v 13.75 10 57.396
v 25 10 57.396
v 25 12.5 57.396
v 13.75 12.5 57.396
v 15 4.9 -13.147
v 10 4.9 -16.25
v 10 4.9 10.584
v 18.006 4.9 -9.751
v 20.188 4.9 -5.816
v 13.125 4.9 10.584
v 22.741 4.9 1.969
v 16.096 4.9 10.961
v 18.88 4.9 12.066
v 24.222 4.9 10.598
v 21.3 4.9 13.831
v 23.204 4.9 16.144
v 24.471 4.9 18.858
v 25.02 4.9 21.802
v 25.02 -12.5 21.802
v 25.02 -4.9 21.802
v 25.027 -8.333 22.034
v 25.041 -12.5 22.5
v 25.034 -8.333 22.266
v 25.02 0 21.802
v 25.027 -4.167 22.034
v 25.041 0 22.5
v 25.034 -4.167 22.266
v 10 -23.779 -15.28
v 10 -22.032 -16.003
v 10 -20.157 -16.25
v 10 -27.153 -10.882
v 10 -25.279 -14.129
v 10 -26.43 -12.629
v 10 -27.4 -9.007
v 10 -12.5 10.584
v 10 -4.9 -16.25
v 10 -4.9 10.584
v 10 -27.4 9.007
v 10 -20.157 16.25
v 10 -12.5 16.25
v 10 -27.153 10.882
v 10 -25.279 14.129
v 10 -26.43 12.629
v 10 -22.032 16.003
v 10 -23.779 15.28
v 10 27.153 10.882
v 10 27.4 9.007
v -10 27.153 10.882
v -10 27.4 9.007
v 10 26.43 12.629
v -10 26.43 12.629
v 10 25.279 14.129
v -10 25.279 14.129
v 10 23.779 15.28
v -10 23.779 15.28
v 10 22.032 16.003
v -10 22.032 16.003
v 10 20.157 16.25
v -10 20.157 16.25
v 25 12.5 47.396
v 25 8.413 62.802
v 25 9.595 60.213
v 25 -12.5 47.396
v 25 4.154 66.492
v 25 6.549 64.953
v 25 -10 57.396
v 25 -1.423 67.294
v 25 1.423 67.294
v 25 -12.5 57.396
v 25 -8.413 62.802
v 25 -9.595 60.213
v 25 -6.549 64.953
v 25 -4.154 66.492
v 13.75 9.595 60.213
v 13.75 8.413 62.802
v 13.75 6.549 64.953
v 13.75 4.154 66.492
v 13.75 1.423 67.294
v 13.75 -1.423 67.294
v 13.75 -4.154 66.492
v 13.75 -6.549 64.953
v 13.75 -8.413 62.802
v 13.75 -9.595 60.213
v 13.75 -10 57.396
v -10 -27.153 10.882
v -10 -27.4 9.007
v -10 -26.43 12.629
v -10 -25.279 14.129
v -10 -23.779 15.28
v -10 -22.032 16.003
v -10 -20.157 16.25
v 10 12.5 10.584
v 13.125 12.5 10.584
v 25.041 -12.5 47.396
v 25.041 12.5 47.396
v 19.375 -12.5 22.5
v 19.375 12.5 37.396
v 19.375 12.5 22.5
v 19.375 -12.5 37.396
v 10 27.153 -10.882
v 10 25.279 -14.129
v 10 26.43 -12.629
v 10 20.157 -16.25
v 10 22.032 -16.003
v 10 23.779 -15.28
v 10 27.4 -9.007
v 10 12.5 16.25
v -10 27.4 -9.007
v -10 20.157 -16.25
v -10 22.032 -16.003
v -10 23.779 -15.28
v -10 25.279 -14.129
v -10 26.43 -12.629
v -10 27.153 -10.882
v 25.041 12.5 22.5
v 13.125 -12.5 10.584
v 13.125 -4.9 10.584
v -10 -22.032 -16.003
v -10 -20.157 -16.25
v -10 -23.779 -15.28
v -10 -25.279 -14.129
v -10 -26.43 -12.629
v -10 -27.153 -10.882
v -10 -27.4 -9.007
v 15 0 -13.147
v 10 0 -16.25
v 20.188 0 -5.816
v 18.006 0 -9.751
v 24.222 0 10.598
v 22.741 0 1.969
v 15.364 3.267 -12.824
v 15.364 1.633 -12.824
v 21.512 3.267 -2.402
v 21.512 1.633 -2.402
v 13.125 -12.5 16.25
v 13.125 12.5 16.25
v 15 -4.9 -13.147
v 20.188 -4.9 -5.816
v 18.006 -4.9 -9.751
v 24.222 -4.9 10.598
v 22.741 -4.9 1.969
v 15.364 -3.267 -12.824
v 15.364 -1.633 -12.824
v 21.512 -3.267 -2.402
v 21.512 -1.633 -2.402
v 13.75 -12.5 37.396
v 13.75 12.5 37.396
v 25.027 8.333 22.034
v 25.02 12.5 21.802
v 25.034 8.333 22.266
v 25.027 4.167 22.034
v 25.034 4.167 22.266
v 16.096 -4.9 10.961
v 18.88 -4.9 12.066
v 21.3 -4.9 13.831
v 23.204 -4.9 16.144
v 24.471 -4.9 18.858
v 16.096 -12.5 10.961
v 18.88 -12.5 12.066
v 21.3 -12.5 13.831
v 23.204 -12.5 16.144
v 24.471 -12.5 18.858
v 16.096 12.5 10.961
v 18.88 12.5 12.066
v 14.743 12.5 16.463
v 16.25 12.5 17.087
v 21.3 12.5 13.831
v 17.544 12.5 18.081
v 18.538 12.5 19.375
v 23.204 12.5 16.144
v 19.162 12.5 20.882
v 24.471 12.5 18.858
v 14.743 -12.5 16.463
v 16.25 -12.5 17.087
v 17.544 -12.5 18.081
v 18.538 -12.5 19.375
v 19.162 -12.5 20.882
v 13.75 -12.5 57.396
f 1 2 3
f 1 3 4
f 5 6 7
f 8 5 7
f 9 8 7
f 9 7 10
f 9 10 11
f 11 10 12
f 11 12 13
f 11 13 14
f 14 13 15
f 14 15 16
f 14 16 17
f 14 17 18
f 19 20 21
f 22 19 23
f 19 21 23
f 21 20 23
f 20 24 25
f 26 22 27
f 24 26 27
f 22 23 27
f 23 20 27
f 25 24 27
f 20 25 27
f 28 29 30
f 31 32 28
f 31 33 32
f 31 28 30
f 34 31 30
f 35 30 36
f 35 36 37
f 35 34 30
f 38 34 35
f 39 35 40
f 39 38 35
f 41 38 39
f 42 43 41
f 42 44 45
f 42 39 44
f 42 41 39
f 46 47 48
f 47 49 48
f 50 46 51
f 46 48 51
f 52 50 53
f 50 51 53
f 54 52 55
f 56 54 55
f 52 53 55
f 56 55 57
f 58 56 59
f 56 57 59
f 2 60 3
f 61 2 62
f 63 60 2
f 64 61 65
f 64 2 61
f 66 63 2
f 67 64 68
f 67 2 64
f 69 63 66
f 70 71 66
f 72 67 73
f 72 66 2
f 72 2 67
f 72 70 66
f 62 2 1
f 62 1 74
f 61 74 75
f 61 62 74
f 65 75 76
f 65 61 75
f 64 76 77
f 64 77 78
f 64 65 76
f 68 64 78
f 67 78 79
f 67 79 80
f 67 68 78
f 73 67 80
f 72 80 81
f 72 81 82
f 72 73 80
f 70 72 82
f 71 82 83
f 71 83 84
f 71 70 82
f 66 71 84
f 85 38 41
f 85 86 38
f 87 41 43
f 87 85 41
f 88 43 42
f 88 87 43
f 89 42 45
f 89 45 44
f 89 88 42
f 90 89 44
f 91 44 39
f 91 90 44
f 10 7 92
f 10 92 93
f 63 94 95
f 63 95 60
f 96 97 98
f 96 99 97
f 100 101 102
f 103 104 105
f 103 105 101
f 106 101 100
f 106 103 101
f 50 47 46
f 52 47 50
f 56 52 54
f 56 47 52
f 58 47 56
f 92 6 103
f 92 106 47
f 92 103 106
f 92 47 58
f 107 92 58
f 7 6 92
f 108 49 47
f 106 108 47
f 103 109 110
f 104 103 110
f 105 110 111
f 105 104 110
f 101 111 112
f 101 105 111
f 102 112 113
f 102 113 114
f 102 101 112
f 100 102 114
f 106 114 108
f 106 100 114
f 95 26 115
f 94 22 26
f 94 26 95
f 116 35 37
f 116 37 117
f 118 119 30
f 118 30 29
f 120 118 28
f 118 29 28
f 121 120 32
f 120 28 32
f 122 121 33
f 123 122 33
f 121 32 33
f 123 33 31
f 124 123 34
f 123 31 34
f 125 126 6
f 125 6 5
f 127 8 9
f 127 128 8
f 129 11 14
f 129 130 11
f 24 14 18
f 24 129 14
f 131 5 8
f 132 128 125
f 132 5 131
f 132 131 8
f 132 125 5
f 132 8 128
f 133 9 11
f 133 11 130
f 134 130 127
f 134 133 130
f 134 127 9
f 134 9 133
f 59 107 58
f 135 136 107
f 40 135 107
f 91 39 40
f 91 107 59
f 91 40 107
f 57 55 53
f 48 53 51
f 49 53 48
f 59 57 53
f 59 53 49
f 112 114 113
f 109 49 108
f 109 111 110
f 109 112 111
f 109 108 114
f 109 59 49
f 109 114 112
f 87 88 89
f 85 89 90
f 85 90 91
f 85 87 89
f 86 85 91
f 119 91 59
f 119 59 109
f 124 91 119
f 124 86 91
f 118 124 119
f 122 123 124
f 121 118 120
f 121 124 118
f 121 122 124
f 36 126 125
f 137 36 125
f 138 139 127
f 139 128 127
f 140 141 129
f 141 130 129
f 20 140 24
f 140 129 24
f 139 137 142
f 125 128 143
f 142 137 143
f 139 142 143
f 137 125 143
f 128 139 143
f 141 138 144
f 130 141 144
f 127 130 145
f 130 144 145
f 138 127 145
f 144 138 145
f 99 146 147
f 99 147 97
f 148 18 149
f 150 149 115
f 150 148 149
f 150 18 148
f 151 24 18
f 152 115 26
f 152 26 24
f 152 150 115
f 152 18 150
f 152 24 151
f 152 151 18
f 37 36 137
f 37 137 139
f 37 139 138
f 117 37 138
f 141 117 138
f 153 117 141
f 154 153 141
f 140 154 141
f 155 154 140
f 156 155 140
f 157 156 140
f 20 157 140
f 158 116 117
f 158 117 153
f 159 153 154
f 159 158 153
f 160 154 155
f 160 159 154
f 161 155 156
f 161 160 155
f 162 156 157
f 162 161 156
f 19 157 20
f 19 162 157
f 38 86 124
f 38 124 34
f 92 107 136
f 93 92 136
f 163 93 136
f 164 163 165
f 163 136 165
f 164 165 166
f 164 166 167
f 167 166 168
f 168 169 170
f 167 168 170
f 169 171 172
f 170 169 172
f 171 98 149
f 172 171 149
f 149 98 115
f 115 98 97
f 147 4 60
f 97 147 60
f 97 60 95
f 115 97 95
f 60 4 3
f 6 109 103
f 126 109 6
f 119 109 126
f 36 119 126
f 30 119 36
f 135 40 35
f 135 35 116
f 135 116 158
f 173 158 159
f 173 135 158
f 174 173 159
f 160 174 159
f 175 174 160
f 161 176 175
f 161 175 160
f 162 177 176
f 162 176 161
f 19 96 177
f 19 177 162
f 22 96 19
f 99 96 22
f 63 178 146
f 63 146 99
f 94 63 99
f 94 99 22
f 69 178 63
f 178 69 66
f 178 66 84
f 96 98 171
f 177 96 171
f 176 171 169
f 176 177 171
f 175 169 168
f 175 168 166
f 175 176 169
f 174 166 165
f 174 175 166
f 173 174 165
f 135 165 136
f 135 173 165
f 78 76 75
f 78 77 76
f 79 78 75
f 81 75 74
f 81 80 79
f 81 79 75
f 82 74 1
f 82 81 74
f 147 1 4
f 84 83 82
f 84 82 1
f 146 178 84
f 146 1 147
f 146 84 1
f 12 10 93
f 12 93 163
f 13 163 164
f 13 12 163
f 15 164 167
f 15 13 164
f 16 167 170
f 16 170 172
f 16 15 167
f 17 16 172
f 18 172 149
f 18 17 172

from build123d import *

# Parameters (mm, degrees)
F1_DEPTH = 27.4
F0_W     = 5.625
F0_H     = 10
F2_DEPTH = 12.5
F3_DEPTH = 4.9
F5_R     = 7.242641


with BuildPart() as f1:
    # F0 (on Front) → F1 (new body, symmetric)
    with BuildSketch(Plane.XZ):
        Polygon((10, 16.25), (-10, 16.25), (-10, -16.25), (10, -16.25), (10, 10.584195), align=None)
    extrude(amount=F1_DEPTH, both=True)

    # F0 (on Front) → F2 (join, symmetric)
    with BuildSketch(Plane.XZ):
        with BuildLine():
            Line((13.125, 16.25), (10, 16.25))
            Line((10, 16.25), (10, 10.584195))
            Line((10, 10.584195), (13.125, 10.584195))
            ThreePointArc((13.125, 10.584195), (21.300311, 13.83105), (25.020355, 21.802188))
            add(Edge.make_bspline(
                [(25.020355, 21.802188), (25.02761, 22.033307), (25.034428, 22.265908), (25.040805, 22.5)],
                knots=[41.280664, 41.280664, 41.280664, 41.280664, 41.566673, 41.566673, 41.566673, 41.566673], degree=3))
            Line((25.040805, 22.5), (25.040805, 47.395553))
            Line((25.040805, 47.395553), (25, 47.395553))
            Line((25, 47.395553), (25, 37.395553))
            Line((25, 37.395553), (19.375, 37.395553))
            Line((19.375, 37.395553), (19.375, 22.5))
            ThreePointArc((19.375, 22.5), (17.544417, 18.080583), (13.125, 16.25))
        make_face()
        Polygon((13.75, 47.395553), (19.375, 47.395553), (25, 47.395553), (25, 57.395553), (13.75, 57.395553), align=None)
        with Locations((16.5625, 42.395553)):
            Rectangle(F0_W, F0_H)
        with Locations((22.1875, 42.395553)):
            Rectangle(F0_W, F0_H)
    extrude(amount=F2_DEPTH, both=True)

    # F0 (on Front) → F3 (join, symmetric)
    with BuildSketch(Plane.XZ):
        with BuildLine():
            Line((13.125, 10.584195), (10, 10.584195))
            Line((10, 10.584195), (10, -16.25))
            add(Edge.make_bspline(
                [(10, -16.25), (13.830885, -14.058451), (23.973214, -11.556052), (25.020355, 21.802188)],
                knots=[0, 0, 0, 0, 41.280664, 41.280664, 41.280664, 41.280664], degree=3))
            ThreePointArc((25.020355, 21.802188), (21.300311, 13.83105), (13.125, 10.584195))
        make_face()
    extrude(amount=F3_DEPTH, both=True)

    # F0 (on Front) → F4 (revolve)
    with BuildSketch(Plane.XZ):
        Polygon((13.75, 47.395553), (19.375, 47.395553), (25, 47.395553), (25, 57.395553), (13.75, 57.395553), align=None)
    revolve(axis=Axis((19.375, 0, 57.395553), (1, 0, 0)))

    # F5
    f5_edges = [f1.edges().sort_by_distance(p)[0] for p in [
        (0, 27.4, 16.25),
        (0, 27.4, -16.25),
        (0, -27.4, 16.25),
        (0, -27.4, -16.25),
    ]]
    fillet(f5_edges, radius=F5_R)


solid = f1.part
